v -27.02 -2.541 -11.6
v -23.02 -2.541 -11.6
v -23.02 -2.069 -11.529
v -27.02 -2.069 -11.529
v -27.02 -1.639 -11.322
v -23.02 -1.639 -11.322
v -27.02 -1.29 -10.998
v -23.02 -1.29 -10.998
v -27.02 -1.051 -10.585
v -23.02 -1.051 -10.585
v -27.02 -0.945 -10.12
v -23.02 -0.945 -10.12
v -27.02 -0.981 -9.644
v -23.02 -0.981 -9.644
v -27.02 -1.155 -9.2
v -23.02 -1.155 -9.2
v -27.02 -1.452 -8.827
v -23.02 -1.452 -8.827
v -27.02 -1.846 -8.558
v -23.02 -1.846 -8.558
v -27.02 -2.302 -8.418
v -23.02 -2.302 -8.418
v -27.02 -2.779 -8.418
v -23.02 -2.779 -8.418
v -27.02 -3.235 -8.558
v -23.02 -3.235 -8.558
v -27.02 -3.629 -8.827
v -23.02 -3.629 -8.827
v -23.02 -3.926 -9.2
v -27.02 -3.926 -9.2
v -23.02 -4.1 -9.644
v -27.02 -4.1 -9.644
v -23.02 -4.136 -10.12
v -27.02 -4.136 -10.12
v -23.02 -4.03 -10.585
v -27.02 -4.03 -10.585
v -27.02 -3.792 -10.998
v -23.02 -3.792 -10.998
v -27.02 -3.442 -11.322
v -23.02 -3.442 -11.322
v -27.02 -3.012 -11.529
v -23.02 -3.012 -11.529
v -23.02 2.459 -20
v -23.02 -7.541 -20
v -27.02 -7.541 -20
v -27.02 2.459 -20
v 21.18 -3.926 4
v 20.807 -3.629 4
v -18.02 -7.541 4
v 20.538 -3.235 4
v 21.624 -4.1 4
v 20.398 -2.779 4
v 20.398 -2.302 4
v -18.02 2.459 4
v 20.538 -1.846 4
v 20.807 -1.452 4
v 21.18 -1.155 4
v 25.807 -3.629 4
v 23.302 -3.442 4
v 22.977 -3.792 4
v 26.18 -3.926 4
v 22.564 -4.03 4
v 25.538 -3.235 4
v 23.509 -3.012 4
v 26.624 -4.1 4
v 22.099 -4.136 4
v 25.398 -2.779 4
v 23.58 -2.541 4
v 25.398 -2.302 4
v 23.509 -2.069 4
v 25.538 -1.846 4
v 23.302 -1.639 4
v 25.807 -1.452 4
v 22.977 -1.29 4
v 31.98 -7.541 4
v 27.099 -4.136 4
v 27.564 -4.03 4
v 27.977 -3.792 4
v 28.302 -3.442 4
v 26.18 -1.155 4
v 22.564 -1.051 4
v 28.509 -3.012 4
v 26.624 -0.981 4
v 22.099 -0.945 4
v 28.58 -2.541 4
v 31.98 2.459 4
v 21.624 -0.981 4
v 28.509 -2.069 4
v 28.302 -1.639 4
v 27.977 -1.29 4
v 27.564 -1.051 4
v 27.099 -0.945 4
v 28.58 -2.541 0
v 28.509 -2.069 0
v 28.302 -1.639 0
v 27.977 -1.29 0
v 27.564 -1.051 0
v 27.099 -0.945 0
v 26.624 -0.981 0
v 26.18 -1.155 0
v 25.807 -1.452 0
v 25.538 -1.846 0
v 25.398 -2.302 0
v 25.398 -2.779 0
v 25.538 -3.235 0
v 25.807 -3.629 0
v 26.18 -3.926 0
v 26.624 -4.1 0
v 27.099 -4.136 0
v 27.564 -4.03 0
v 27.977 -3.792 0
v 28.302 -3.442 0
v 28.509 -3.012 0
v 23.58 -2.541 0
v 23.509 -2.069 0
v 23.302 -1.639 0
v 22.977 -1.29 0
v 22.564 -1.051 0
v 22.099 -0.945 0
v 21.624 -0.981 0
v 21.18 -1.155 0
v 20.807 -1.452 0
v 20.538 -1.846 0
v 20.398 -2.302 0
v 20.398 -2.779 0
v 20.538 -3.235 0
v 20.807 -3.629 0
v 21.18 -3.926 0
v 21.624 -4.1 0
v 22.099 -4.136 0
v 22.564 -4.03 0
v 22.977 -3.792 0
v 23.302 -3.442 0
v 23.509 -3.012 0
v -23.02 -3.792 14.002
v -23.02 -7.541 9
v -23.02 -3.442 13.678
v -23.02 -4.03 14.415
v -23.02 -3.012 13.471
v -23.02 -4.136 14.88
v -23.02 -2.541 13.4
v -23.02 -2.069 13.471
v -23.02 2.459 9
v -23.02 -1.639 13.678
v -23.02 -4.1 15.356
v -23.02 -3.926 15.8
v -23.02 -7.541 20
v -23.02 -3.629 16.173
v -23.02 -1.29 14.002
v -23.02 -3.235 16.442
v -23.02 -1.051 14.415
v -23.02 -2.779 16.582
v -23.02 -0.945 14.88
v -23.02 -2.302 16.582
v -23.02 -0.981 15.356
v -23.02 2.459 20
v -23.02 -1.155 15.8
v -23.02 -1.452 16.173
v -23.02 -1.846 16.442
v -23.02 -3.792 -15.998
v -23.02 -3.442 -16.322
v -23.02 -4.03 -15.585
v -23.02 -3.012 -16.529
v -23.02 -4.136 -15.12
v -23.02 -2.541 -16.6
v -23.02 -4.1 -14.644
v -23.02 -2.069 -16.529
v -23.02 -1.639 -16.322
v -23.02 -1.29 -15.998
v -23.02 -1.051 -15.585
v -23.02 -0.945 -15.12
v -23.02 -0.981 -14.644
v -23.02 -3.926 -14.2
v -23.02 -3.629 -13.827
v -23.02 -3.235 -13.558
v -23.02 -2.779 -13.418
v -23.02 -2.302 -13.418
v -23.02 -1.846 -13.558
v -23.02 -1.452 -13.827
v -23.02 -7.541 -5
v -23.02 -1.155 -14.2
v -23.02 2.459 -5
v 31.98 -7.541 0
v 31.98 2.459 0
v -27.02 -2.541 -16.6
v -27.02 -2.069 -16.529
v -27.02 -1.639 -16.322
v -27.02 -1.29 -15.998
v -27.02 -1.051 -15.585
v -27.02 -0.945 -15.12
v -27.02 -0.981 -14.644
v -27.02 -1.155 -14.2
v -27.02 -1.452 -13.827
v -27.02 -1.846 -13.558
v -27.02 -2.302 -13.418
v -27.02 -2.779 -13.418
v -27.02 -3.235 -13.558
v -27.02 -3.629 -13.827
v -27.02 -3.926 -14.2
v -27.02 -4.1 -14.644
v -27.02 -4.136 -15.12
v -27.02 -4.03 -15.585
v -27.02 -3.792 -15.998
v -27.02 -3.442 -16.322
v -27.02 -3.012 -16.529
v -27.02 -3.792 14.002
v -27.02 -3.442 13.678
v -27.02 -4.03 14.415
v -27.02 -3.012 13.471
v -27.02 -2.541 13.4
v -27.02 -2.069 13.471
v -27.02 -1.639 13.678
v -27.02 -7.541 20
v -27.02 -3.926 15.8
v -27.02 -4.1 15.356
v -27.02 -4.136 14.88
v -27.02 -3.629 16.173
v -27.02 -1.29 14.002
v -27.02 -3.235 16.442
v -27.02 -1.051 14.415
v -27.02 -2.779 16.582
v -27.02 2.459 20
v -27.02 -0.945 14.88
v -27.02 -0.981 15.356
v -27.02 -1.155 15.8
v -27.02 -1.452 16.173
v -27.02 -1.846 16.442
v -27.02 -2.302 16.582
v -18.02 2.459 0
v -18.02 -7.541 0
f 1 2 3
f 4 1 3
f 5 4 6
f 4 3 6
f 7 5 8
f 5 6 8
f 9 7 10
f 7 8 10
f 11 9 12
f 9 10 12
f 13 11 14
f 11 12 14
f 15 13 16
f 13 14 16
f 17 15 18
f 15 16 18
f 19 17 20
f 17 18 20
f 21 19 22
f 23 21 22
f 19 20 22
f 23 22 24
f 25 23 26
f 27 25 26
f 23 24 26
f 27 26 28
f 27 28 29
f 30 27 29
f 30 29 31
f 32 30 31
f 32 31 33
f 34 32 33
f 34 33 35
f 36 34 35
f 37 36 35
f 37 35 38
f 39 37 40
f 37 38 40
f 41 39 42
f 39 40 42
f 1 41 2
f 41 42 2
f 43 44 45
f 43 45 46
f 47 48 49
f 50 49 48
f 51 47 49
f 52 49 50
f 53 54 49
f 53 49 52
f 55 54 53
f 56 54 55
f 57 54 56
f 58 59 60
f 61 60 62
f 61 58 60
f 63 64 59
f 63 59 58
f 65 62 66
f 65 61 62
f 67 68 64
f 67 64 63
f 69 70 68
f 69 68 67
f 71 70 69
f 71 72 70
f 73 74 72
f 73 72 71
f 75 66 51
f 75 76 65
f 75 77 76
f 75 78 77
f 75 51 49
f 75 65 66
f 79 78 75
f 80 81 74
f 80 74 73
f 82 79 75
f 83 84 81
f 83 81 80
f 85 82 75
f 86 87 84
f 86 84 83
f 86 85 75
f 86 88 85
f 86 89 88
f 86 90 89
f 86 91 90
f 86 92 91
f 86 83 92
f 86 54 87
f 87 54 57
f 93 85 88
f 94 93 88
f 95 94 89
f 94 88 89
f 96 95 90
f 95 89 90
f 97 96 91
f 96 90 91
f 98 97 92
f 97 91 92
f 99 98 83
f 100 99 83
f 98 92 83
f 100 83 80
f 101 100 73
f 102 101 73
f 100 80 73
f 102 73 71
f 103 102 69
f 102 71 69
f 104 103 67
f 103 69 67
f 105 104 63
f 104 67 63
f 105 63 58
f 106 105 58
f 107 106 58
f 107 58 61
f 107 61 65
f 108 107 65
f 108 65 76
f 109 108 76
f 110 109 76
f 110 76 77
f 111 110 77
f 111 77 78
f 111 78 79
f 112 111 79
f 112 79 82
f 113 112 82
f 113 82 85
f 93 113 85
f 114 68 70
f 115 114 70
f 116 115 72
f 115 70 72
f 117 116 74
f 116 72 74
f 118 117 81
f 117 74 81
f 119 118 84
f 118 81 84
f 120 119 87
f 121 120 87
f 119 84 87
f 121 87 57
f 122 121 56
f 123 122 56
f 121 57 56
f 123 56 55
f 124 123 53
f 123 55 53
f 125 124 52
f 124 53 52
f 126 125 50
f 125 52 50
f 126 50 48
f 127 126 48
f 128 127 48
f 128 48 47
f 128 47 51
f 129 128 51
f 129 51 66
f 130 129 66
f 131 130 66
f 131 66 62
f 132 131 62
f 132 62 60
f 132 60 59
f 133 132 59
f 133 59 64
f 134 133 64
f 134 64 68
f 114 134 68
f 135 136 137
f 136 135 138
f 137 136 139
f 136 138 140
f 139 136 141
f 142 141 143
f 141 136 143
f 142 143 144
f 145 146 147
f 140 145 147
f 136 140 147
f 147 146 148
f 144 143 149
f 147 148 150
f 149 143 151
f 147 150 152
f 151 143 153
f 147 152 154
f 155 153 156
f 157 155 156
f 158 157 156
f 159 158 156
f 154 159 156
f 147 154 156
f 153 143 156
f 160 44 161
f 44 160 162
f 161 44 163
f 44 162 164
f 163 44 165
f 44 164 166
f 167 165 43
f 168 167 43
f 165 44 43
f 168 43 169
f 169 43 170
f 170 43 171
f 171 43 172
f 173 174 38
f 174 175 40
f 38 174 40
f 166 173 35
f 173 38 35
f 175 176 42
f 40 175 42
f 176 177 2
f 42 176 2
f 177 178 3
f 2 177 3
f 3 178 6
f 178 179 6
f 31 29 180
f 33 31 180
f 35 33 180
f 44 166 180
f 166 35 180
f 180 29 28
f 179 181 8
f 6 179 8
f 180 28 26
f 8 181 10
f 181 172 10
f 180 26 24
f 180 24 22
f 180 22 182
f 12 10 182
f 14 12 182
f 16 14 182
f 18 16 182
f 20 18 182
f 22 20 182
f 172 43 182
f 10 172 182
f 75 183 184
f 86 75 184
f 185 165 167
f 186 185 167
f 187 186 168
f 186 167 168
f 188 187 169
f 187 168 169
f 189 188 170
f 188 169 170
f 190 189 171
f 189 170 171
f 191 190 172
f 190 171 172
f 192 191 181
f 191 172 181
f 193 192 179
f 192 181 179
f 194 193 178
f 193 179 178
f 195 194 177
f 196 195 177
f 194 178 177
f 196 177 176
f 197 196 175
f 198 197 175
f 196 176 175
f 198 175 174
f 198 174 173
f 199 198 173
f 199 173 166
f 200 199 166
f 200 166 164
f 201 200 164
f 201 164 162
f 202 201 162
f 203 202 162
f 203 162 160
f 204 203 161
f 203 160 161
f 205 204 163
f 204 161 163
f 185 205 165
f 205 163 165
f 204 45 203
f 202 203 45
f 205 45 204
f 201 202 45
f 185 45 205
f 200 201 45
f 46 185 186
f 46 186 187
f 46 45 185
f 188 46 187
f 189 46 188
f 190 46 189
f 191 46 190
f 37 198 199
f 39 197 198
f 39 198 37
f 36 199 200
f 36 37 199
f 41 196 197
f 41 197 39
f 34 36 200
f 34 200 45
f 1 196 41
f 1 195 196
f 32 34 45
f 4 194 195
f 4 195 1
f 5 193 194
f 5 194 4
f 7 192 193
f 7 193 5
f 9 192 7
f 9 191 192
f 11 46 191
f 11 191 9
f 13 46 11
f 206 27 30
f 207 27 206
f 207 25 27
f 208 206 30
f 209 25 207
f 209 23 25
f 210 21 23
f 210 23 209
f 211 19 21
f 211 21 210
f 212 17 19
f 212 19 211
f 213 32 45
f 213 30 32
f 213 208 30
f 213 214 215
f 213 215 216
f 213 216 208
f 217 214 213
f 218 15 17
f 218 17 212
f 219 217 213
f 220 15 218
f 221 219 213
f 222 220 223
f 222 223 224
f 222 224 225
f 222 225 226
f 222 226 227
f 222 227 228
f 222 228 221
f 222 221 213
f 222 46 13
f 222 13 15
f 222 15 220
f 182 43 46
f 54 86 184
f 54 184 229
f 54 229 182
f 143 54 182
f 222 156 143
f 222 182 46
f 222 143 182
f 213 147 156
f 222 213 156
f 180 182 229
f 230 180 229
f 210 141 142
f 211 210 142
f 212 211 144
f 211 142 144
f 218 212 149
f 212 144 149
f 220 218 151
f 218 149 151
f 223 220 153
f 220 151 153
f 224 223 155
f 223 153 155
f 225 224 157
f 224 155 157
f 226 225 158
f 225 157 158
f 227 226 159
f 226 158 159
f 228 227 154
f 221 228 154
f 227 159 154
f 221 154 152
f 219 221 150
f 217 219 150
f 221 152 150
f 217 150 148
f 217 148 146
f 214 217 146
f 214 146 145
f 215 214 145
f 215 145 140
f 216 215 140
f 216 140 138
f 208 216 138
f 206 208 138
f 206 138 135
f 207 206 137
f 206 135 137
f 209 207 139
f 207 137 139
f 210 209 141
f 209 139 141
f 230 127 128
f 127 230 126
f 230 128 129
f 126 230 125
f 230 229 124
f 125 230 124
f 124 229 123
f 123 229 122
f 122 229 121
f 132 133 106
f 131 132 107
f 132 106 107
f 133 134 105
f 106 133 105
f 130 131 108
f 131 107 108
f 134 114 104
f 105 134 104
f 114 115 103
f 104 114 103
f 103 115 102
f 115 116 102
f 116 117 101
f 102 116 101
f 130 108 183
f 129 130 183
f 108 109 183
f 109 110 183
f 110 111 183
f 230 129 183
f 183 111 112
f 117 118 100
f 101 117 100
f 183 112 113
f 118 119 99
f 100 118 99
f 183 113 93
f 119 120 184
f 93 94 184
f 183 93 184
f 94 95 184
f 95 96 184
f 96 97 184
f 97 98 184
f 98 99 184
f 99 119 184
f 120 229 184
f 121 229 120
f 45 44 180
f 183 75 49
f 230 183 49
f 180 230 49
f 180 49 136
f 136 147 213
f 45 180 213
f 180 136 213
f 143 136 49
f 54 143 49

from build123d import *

# Parameters (mm, degrees)
SKETCH_1_W          = 55
SKETCH_1_H          = 10
EXTRUDE_1_DEPTH     = 4
SKETCH_2_W          = 40
SKETCH_2_H          = 10
EXTRUDE_2_DEPTH     = 4
EXTRUDE_3_DEPTH     = 10
EXTRUDE_5_DEPTH     = 10
SKETCH_4_R          = 1.6
CUT_EXTRUDE_1_DEPTH = 5
SKETCH_7_R          = 1.6
CUT_EXTRUDE_2_DEPTH = 4


with BuildPart() as part:
    # ｽｹｯﾁ1 → ﾎﾞｽ - 押し出し1 (new body)
    with BuildSketch(Plane.XY):
        with Locations((4.479686187, -2.540603248)):
            Rectangle(SKETCH_1_W, SKETCH_1_H)
    extrude(amount=EXTRUDE_1_DEPTH)

    # ｽｹｯﾁ2 → ﾎﾞｽ - 押し出し2 (add)
    with BuildSketch(Plane.ZY.offset(23.020313813)):
        with Locations((0, -2.540603248)):
            Rectangle(SKETCH_2_W, SKETCH_2_H)
    extrude(amount=EXTRUDE_2_DEPTH)

    # ｽｹｯﾁ3 → ﾎﾞｽ - 押し出し3 (add)
    with BuildSketch(Plane(origin=(0, 2.459396752, 0), x_dir=(1, 0, 0), z_dir=(0, 1, 0))):
        Polygon((-23.020313813, 5), (-18.020313813, 0), (-23.020313813, 0), align=None)
    extrude(amount=-EXTRUDE_3_DEPTH)

    # ｽｹｯﾁ6 → ﾎﾞｽ - 押し出し5 (add)
    with BuildSketch(Plane.XZ.offset(7.540603248)):
        Polygon((-23.020313813, 9), (-18.020313813, 4), (31.979686187, 4), (31.979686187, 0), (-18.020313813, 0), (-23.020313813, -5), (-23.020313813, -20), (-27.020313813, -20), (-27.020313813, 20), (-23.020313813, 20), align=None)
    extrude(amount=-EXTRUDE_5_DEPTH)

    # ｽｹｯﾁ4 → ｶｯﾄ - 押し出し1 (cut)
    with BuildSketch(Plane.XY.offset(4)):
        with Locations((26.979686187, -2.540603248)):
            Circle(SKETCH_4_R)
        with Locations((21.979686187, -2.540603248)):
            Circle(SKETCH_4_R)
    extrude(amount=-CUT_EXTRUDE_1_DEPTH, mode=Mode.SUBTRACT)

    # ｽｹｯﾁ7 → ｶｯﾄ - 押し出し2 (cut)
    with BuildSketch(Plane(origin=(-23.020313813, 0, 0), x_dir=(0, 0, -1), z_dir=(1, 0, 0))):
        with Locations((-15, -2.540603248)):
            Circle(SKETCH_7_R)
        with Locations((10, -2.540603248)):
            Circle(SKETCH_7_R)
        with Locations((15, -2.540603248)):
            Circle(SKETCH_7_R)
    extrude(amount=-CUT_EXTRUDE_2_DEPTH, mode=Mode.SUBTRACT)


solid = part.part
